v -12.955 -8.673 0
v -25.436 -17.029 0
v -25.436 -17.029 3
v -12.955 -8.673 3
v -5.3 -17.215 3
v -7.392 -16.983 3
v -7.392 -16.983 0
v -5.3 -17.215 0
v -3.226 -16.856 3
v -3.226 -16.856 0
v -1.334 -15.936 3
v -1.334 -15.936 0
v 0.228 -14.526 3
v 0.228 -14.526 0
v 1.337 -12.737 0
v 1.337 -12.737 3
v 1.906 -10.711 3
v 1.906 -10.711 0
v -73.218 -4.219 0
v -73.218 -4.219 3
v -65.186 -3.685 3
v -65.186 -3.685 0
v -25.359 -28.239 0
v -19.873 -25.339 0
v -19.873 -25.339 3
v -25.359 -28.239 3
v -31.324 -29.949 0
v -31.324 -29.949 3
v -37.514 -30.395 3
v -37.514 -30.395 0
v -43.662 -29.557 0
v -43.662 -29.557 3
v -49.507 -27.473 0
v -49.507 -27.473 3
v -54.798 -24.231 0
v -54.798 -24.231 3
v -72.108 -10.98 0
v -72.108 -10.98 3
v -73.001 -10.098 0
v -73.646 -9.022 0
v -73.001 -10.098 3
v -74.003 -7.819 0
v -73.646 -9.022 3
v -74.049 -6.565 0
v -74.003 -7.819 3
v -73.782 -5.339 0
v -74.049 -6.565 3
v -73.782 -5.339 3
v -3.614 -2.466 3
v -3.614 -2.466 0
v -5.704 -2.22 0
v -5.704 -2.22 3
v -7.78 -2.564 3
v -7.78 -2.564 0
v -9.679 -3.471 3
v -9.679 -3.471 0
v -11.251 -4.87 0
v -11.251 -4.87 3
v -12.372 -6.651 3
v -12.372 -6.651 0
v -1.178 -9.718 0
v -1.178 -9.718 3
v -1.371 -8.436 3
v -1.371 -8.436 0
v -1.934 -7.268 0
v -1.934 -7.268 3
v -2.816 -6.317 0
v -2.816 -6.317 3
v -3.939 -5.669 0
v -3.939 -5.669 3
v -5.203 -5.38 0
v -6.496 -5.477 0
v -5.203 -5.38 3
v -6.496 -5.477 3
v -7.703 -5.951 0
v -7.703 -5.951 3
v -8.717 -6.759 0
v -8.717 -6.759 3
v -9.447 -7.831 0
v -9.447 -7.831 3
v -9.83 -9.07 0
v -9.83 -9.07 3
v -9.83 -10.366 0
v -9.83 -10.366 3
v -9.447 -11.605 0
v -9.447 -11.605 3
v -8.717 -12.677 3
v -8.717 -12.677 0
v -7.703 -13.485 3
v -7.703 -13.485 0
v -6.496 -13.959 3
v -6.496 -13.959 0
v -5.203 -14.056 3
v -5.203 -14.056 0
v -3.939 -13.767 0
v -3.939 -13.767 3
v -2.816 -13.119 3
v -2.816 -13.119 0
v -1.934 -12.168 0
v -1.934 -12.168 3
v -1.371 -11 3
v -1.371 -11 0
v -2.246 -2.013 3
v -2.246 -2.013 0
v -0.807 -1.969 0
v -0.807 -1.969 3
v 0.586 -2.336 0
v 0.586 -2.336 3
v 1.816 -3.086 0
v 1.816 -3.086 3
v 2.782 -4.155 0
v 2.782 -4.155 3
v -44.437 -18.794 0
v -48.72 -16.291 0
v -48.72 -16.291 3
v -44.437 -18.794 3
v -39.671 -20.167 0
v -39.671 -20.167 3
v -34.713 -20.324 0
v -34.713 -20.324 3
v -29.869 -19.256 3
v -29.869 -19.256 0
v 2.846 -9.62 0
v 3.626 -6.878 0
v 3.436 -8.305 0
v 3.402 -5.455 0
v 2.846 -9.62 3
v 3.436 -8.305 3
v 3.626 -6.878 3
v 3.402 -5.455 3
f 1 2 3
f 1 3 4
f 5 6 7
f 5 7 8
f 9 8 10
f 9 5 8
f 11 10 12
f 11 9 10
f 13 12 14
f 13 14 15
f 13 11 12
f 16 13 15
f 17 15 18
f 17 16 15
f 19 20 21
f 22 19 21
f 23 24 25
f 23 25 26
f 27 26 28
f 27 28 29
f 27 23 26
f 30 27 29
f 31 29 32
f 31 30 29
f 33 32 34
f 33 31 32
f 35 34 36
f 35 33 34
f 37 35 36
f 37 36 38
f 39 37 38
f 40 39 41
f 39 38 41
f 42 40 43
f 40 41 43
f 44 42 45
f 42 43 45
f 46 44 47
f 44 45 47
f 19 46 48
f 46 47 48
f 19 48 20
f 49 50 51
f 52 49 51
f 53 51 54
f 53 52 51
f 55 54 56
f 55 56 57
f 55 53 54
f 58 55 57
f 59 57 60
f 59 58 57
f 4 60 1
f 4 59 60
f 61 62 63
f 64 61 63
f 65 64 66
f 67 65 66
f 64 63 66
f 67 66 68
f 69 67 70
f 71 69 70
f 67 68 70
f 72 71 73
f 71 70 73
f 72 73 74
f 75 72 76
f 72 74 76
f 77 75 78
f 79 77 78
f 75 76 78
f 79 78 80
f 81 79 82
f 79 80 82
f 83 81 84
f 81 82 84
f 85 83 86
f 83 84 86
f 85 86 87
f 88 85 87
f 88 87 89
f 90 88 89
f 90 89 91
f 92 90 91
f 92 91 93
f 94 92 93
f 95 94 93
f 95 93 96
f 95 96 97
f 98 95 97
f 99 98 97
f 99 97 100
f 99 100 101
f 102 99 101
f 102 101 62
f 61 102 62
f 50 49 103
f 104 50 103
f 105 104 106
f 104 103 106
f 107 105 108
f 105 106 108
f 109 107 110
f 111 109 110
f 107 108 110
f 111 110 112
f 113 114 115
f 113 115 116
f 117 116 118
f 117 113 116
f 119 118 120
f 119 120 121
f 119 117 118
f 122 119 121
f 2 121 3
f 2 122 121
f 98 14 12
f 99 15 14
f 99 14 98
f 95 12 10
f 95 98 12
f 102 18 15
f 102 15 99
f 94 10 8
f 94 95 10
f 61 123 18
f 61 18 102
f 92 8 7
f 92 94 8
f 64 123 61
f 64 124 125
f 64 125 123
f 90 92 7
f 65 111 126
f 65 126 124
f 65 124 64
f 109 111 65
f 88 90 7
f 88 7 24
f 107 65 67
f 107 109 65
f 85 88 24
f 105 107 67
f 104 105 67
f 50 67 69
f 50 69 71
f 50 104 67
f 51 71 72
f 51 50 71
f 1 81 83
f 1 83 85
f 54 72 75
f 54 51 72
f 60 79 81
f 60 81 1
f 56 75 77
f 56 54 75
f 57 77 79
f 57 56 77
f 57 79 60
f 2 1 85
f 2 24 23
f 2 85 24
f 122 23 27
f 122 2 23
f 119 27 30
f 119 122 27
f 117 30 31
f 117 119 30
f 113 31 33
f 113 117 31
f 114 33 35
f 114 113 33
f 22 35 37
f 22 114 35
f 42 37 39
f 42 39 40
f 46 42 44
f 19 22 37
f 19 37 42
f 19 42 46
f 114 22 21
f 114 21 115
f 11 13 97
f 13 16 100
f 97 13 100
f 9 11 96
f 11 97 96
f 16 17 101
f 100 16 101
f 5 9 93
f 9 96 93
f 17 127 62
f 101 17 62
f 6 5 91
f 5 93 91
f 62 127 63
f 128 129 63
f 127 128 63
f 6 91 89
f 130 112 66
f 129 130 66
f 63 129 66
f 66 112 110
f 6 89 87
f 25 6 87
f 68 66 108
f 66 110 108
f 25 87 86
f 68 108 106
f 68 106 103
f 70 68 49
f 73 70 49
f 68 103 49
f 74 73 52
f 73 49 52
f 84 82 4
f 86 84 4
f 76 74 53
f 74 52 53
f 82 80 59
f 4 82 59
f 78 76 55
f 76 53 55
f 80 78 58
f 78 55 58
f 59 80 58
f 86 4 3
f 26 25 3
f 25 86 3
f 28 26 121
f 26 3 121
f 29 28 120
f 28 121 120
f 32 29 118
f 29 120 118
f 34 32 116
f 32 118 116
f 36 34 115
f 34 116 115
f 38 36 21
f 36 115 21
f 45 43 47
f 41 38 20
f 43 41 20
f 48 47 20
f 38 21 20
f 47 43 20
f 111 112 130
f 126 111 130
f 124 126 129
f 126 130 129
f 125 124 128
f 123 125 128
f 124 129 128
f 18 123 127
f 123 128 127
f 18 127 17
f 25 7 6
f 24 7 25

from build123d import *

# Parameters (mm, degrees)
EXTRU_MINCE1_DEPTH      = 3
CONG_1_R                = 5
ESQUISSE2_R             = 7.5
BOSS_EXTRU_1_DEPTH      = 3
ESQUISSE3_R             = 4.35
ENL_V_MAT_EXTRU_1_DEPTH = 6
ENL_V_MAT_EXTRU_2_DEPTH = 10


with BuildPart() as part:
    # Esquisse1 → Extru.-Mince1 (new body)
    with BuildSketch(Plane.XY):
        with BuildLine():
            Line((-70, 0), (-48.719716507, -16.290501455))
            ThreePointArc((-48.719716507, -16.290501455), (-37.196582195, -20.399539826), (-25.436213508, -17.028998471))
            Line((-25.436213508, -17.028998471), (0, 0))
            Line((0, 0), (5.563167687, -8.309703081))
            Line((5.563167687, -8.309703081), (-19.873045821, -25.338701551))
            ThreePointArc((-19.873045821, -25.338701551), (-37.513598853, -30.394513585), (-54.79830032, -24.230956028))
            Line((-54.79830032, -24.230956028), (-76.078583813, -7.940454573))
            Line((-76.078583813, -7.940454573), (-70, 0))
        make_face()
    extrude(amount=EXTRU_MINCE1_DEPTH)

    # Congé1
    cong_1_edges = [part.edges().sort_by_distance(p)[0] for p in [
        (-76.078583813, -7.940454573, 1.5),
        (5.563167687, -8.309703081, 1.5),
        (0, 0, 1.5),
    ]]
    fillet(cong_1_edges, radius=CONG_1_R - 0.0001)  # a hair under: the kernel refuses the full size

    # Esquisse2 → Boss.-Extru.1 (add)
    with BuildSketch(Plane.XY.offset(3)):
        with Locations((-5.528119238, -9.718019227)):
            Circle(ESQUISSE2_R)
    extrude(amount=-BOSS_EXTRU_1_DEPTH)

    # Esquisse3 → Enlèv. mat.-Extru.1 (cut)
    with BuildSketch(Plane.XY.offset(3)):
        with Locations((-5.528119238, -9.718019227)):
            Circle(ESQUISSE3_R)
    extrude(amount=-ENL_V_MAT_EXTRU_1_DEPTH, mode=Mode.SUBTRACT)

    # Esquisse4 → Enlèv. mat.-Extru.2 (cut)
    with BuildSketch(Plane.XY.offset(3)):
        Polygon((-73.230010145, -4.219362538), (-65.186412562, -3.684901716), (-70, 0), align=None)
    extrude(amount=-ENL_V_MAT_EXTRU_2_DEPTH, mode=Mode.SUBTRACT)


solid = part.part
